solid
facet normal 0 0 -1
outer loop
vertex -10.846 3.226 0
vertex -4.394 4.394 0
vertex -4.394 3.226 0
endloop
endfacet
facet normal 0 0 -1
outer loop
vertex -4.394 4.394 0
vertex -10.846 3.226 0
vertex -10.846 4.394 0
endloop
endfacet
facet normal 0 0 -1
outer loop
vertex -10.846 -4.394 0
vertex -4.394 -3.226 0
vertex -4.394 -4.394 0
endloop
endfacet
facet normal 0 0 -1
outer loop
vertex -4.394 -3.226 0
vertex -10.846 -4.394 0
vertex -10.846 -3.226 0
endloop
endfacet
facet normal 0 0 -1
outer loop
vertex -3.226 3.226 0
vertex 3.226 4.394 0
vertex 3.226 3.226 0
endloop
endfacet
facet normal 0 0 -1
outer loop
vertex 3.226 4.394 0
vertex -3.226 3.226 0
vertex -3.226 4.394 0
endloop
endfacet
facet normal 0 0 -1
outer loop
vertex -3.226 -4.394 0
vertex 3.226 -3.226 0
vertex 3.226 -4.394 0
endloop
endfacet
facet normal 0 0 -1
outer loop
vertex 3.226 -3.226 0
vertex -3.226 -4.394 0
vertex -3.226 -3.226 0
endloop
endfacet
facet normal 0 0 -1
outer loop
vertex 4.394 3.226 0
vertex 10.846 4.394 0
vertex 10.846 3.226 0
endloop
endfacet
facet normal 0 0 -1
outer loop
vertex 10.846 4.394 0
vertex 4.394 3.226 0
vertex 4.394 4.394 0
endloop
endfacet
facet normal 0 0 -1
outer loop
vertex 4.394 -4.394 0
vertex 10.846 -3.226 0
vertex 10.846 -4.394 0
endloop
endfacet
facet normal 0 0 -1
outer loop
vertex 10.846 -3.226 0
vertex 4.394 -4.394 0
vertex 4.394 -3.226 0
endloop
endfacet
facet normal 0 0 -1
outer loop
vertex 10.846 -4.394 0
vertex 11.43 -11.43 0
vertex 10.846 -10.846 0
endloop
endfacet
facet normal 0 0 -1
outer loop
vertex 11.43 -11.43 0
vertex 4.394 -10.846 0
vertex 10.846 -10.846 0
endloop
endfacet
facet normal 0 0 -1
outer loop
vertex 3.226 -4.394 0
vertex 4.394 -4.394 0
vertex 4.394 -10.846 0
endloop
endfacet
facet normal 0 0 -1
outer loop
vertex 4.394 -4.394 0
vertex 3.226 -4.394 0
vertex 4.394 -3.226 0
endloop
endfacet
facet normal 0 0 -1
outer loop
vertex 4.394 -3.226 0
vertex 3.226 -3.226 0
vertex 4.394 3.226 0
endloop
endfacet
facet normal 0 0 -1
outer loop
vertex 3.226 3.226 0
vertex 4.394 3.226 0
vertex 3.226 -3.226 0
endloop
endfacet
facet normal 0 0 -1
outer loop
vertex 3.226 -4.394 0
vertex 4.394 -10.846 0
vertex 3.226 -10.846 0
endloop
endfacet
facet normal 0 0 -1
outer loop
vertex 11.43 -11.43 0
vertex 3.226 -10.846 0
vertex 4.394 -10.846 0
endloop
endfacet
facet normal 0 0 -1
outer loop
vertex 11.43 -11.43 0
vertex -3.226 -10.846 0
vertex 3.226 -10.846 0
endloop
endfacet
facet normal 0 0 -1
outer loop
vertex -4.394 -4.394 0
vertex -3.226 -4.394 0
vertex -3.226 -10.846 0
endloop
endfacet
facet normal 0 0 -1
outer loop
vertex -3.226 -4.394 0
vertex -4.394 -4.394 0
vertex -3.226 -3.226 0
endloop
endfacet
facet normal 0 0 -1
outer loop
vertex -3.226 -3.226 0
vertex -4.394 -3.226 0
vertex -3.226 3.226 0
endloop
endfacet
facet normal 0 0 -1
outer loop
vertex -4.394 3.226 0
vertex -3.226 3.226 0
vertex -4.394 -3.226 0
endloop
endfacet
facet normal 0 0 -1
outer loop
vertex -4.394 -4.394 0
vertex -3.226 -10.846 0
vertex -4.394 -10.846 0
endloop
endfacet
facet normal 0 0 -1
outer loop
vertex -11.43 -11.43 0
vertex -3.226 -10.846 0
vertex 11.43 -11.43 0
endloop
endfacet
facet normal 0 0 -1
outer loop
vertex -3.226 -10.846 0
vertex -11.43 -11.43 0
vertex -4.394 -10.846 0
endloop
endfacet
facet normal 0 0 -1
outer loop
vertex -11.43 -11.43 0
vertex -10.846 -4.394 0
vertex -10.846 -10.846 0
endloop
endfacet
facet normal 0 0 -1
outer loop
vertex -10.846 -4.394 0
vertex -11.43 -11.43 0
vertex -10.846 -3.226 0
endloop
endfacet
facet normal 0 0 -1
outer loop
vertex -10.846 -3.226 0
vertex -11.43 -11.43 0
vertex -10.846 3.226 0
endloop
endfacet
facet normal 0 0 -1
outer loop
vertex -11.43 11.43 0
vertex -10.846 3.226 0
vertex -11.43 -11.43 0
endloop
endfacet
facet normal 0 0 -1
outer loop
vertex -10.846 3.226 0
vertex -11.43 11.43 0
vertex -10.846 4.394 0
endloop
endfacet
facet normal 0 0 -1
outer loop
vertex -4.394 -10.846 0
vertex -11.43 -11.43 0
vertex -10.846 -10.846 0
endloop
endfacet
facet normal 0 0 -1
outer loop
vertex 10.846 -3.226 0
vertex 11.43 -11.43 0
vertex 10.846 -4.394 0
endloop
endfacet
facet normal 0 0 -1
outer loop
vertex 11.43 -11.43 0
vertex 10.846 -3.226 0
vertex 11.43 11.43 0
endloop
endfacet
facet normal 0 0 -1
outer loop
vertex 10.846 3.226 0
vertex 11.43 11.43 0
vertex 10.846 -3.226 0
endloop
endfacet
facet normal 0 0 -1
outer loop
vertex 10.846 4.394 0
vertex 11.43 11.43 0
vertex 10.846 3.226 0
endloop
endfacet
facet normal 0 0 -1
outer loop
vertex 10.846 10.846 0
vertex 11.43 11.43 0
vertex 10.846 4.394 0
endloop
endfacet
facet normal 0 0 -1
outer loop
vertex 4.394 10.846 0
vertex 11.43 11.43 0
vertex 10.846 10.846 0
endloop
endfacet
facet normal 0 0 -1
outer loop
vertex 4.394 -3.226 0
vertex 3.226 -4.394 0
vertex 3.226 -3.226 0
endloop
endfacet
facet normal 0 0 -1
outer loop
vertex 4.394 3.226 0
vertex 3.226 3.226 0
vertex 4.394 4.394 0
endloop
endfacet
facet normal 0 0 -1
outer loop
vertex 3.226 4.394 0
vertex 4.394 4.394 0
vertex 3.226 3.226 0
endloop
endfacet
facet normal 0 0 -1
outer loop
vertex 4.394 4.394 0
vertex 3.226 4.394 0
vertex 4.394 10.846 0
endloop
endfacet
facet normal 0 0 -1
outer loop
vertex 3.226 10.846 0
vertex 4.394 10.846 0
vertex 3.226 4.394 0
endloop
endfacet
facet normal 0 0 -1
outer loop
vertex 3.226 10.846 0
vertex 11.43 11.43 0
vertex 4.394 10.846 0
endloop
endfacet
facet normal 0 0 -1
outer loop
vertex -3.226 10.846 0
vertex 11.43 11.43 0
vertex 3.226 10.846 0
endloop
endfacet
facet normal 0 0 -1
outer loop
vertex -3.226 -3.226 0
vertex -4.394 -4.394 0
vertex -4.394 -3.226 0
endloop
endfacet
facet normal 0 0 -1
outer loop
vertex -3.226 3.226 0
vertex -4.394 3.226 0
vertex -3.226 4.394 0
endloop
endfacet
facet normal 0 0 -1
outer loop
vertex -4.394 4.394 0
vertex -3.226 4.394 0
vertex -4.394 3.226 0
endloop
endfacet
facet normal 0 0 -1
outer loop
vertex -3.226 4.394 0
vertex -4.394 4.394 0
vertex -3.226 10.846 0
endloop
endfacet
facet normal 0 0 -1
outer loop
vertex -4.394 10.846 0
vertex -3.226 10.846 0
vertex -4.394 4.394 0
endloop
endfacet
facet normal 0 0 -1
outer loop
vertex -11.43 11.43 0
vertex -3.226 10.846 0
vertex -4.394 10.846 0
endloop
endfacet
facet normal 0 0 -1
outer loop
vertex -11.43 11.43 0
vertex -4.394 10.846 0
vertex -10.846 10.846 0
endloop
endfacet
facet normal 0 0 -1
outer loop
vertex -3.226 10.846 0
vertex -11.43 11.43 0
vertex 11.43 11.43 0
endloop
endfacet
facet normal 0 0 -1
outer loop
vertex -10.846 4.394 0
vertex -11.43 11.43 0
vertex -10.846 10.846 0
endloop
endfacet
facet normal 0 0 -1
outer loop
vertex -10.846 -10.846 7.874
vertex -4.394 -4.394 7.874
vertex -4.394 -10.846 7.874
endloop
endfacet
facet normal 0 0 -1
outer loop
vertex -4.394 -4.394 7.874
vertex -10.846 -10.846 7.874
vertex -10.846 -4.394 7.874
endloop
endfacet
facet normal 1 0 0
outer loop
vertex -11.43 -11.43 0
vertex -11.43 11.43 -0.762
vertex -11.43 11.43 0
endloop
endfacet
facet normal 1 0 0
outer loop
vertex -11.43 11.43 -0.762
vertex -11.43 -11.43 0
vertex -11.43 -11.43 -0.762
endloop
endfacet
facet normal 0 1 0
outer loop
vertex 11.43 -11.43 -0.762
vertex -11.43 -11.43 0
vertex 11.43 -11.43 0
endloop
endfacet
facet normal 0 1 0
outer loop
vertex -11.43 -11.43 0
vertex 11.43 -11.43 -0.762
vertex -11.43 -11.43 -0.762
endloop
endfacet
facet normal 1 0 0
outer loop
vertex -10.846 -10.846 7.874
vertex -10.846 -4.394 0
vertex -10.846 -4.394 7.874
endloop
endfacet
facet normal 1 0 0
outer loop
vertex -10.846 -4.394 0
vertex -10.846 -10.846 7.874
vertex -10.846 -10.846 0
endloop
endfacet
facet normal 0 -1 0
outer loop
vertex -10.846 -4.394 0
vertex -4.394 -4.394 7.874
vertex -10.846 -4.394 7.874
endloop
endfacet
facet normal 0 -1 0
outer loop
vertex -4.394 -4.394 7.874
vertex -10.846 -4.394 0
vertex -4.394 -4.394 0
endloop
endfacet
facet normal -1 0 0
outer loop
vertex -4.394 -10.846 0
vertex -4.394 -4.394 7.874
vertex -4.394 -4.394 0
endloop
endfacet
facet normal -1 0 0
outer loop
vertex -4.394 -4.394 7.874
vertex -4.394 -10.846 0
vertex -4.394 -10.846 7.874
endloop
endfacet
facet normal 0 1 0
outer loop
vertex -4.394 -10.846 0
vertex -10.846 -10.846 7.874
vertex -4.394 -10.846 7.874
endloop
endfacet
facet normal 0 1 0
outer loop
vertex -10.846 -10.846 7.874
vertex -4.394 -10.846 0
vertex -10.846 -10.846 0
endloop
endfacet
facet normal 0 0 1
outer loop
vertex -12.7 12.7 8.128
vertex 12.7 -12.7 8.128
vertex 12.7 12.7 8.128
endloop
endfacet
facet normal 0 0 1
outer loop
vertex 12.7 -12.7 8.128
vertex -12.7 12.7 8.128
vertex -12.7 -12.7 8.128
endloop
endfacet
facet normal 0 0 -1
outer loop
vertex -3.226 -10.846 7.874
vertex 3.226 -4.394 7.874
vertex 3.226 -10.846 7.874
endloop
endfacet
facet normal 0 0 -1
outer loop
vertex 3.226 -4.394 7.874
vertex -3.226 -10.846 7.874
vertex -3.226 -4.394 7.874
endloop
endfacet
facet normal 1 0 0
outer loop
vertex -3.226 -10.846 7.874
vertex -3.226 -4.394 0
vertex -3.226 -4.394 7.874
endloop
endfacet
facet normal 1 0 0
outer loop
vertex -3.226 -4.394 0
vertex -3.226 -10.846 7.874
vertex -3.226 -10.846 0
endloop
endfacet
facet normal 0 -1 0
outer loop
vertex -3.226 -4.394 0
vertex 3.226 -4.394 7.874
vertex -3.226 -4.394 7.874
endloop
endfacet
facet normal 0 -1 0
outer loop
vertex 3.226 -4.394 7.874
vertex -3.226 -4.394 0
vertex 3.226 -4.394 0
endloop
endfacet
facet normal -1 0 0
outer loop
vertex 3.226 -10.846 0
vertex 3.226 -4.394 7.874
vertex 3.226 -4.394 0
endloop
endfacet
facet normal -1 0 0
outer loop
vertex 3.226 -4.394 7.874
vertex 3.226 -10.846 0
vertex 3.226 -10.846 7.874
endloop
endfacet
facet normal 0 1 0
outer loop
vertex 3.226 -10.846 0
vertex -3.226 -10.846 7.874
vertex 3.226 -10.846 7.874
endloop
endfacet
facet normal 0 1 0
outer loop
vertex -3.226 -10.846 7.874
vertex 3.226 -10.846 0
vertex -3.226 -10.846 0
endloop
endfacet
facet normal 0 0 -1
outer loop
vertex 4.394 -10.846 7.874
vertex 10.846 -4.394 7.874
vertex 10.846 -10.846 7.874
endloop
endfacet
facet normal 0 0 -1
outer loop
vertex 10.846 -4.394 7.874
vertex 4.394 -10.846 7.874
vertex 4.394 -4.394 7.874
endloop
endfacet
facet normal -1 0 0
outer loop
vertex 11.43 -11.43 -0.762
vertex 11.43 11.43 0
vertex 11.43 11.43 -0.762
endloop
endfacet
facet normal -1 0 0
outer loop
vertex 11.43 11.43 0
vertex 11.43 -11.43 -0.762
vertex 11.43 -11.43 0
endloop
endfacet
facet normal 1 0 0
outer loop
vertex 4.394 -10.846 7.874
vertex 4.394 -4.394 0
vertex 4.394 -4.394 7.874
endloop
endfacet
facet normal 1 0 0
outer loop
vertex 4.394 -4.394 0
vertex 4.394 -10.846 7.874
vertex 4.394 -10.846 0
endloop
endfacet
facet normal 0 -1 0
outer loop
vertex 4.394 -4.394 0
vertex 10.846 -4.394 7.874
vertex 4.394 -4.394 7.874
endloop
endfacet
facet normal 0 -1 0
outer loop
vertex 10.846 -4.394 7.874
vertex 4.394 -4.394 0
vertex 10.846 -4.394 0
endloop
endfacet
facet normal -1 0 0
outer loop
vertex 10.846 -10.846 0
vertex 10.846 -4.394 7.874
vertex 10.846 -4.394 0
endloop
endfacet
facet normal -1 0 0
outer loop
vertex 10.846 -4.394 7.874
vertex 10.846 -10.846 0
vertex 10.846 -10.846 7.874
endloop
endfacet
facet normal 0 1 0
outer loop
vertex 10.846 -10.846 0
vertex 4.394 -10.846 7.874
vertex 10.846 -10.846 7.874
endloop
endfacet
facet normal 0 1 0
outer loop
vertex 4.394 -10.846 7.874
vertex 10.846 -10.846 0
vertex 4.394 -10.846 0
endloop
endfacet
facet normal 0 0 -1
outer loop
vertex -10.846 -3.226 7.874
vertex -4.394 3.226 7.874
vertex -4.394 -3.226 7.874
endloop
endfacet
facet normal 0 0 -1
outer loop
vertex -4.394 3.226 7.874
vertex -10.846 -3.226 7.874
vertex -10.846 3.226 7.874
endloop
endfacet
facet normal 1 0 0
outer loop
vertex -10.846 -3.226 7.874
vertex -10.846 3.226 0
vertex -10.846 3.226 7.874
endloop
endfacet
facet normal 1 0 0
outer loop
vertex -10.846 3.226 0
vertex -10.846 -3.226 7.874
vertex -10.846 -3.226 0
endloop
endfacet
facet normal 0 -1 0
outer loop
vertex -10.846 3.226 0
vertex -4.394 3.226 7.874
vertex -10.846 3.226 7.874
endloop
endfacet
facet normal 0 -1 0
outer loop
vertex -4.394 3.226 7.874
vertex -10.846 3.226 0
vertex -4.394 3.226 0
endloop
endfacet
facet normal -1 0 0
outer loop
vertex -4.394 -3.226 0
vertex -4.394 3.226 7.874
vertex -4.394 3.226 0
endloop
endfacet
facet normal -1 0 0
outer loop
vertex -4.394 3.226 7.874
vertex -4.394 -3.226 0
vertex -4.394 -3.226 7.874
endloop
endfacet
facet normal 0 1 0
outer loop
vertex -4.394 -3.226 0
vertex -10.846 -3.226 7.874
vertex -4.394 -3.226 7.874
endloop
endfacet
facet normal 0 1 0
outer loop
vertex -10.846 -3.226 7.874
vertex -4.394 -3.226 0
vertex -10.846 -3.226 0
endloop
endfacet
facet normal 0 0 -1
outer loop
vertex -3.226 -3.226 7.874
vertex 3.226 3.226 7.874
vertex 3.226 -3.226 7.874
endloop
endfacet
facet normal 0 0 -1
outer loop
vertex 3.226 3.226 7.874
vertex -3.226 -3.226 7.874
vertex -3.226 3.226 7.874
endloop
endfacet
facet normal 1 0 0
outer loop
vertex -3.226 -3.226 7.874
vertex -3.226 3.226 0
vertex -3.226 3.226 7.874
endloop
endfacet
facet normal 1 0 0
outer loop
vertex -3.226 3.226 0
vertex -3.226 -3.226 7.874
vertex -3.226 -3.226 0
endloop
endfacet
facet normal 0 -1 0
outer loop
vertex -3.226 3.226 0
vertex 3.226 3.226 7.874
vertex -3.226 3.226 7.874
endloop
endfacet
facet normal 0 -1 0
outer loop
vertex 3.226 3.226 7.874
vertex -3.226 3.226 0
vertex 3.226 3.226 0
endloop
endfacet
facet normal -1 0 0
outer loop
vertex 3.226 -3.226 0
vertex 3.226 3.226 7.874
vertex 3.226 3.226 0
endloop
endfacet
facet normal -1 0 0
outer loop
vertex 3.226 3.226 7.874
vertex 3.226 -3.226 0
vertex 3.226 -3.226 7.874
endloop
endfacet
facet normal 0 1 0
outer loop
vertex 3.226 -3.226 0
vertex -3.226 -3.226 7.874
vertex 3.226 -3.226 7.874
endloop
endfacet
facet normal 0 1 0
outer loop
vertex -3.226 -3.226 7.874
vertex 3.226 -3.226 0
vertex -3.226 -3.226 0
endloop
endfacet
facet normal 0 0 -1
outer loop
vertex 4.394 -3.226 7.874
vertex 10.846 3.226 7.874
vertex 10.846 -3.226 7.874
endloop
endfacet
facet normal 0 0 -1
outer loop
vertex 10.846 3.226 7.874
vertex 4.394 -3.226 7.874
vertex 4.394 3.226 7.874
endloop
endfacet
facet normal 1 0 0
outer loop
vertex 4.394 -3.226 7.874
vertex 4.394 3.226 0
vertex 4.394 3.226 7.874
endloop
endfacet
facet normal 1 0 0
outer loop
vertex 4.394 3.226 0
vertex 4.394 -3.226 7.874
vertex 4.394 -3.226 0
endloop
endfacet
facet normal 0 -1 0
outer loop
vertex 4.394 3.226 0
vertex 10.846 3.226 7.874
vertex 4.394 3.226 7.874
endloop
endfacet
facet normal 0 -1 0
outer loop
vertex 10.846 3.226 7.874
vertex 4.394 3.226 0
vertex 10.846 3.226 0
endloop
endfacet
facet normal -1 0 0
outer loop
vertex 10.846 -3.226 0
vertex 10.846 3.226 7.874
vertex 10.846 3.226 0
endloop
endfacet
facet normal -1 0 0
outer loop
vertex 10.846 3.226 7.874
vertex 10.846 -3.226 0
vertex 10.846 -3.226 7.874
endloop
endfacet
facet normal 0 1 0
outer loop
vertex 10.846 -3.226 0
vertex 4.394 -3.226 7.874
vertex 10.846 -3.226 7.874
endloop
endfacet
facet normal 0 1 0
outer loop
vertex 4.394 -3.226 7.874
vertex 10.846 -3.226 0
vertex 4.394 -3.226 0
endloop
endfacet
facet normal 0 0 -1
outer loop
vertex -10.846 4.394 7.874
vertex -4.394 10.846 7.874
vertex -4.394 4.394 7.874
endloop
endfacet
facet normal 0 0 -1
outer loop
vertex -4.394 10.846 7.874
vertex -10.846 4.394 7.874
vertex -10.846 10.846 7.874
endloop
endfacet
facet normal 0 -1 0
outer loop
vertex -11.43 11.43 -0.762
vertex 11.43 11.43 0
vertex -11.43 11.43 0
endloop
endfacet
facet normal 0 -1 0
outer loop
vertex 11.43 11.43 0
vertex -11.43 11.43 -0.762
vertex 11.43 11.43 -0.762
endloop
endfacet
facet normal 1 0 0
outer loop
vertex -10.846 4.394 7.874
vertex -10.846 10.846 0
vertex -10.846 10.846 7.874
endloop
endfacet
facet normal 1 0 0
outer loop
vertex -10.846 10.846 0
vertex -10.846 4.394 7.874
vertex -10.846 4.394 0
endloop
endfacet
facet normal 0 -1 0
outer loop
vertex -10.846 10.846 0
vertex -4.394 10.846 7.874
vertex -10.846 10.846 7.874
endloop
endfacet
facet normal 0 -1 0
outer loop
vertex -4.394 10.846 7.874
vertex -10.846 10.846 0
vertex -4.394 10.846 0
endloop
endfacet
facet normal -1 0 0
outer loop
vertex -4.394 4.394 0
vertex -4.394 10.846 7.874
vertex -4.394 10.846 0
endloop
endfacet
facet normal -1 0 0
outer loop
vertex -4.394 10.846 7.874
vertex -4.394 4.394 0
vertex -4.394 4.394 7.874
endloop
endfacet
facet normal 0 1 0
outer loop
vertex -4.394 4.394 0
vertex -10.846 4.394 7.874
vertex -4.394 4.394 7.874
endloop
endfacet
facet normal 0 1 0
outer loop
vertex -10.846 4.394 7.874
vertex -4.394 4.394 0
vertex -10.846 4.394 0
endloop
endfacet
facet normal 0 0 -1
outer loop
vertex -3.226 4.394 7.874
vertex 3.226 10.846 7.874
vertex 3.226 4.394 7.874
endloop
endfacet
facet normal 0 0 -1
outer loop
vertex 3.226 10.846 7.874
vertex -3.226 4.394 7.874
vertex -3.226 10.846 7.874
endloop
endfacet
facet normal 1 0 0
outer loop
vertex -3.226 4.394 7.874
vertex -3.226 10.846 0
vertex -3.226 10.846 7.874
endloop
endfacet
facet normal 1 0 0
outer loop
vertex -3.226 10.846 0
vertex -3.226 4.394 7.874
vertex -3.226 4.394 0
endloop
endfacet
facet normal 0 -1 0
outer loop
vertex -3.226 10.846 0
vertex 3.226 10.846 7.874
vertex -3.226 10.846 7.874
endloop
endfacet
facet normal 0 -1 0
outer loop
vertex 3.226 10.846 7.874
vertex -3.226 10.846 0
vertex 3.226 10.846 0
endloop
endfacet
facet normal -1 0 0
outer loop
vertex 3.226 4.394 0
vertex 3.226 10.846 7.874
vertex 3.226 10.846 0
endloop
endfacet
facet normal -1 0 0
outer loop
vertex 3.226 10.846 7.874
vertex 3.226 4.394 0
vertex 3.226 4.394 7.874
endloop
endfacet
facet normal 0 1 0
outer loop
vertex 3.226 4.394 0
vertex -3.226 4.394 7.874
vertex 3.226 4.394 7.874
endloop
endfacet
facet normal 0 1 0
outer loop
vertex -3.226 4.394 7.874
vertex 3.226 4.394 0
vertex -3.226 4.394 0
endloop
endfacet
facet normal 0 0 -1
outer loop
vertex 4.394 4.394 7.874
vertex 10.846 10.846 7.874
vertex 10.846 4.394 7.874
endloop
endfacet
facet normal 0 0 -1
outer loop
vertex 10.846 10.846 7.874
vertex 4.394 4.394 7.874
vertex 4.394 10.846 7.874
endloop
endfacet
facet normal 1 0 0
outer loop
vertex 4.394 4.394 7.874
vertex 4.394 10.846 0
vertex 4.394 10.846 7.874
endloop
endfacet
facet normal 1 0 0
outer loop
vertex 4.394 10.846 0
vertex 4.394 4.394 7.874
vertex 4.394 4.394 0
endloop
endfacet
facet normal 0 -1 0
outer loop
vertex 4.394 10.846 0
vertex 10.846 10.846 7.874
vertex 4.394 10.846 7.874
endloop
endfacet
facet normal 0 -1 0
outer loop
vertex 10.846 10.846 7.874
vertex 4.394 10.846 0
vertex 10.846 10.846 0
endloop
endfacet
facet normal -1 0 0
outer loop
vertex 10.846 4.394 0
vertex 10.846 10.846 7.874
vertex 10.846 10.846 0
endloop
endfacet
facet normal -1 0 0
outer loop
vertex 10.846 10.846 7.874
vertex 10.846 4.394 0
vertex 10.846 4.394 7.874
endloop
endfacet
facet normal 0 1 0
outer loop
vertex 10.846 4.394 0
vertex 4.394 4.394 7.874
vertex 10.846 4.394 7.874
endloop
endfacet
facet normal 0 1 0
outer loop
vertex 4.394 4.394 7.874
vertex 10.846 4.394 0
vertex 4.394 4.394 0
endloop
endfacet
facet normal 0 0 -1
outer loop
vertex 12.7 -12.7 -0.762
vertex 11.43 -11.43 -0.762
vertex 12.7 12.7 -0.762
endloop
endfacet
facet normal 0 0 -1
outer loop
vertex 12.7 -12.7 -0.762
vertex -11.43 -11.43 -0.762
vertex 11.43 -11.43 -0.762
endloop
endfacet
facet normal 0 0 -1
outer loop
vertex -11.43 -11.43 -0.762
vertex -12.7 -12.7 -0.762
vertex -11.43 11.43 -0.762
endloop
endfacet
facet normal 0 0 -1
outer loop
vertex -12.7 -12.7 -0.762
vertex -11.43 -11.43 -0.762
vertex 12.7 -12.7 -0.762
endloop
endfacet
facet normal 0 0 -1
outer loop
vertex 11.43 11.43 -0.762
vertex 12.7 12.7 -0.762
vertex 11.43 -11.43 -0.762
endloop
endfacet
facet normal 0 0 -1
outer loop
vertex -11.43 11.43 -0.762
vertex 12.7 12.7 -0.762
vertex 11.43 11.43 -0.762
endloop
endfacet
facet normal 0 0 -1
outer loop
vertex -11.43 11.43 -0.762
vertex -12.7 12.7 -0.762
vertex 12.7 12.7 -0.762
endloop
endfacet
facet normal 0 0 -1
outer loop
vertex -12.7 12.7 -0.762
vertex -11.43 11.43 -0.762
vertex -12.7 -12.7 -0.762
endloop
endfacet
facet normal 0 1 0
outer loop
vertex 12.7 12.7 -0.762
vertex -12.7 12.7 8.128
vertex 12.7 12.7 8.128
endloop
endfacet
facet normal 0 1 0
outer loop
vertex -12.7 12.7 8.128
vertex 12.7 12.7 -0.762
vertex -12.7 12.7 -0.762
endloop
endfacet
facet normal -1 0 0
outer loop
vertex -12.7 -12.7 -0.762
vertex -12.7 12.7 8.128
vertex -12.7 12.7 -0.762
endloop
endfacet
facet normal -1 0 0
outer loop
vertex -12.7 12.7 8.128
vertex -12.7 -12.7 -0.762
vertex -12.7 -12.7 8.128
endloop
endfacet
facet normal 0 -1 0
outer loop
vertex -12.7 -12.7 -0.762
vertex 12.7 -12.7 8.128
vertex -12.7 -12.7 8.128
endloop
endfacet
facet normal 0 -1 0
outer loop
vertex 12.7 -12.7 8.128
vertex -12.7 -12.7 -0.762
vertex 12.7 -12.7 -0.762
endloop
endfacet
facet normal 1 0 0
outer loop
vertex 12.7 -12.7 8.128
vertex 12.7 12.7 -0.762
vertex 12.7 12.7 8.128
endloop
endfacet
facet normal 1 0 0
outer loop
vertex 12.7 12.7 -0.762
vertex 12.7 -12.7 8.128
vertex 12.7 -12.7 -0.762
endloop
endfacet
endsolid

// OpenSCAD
ViewScale = [0.0254, 0.0254, 0.0254];

extension = 0;
rows = 3;
cols = 3;
facemils = 10;
module cell()
{
    //rotate([180, 0, 0]) {
    linear_extrude(310+extension)
    difference() {
        square(300, center=true);
        square(254, center=true);
    }
    translate([0, 0, 310+extension])
    linear_extrude(facemils)
    square(300, center=true);
    //}
}


scale(ViewScale)
{
    // cells
    translate([-(rows * 100), -(cols*100), 0])
    for (jj = [0:300:(rows-1)*300]) {
    for (ii = [0:300:(cols-1)*300]) {
        translate([ii, jj, 0]) cell();
    }}

    // outer box
    translate([0, 0, -40 + facemils]) 
    linear_extrude(350 + extension)
    difference() {
        square(rows * 300 + 100, center=true);
        square(cols * 300, center=true);
    }
}
